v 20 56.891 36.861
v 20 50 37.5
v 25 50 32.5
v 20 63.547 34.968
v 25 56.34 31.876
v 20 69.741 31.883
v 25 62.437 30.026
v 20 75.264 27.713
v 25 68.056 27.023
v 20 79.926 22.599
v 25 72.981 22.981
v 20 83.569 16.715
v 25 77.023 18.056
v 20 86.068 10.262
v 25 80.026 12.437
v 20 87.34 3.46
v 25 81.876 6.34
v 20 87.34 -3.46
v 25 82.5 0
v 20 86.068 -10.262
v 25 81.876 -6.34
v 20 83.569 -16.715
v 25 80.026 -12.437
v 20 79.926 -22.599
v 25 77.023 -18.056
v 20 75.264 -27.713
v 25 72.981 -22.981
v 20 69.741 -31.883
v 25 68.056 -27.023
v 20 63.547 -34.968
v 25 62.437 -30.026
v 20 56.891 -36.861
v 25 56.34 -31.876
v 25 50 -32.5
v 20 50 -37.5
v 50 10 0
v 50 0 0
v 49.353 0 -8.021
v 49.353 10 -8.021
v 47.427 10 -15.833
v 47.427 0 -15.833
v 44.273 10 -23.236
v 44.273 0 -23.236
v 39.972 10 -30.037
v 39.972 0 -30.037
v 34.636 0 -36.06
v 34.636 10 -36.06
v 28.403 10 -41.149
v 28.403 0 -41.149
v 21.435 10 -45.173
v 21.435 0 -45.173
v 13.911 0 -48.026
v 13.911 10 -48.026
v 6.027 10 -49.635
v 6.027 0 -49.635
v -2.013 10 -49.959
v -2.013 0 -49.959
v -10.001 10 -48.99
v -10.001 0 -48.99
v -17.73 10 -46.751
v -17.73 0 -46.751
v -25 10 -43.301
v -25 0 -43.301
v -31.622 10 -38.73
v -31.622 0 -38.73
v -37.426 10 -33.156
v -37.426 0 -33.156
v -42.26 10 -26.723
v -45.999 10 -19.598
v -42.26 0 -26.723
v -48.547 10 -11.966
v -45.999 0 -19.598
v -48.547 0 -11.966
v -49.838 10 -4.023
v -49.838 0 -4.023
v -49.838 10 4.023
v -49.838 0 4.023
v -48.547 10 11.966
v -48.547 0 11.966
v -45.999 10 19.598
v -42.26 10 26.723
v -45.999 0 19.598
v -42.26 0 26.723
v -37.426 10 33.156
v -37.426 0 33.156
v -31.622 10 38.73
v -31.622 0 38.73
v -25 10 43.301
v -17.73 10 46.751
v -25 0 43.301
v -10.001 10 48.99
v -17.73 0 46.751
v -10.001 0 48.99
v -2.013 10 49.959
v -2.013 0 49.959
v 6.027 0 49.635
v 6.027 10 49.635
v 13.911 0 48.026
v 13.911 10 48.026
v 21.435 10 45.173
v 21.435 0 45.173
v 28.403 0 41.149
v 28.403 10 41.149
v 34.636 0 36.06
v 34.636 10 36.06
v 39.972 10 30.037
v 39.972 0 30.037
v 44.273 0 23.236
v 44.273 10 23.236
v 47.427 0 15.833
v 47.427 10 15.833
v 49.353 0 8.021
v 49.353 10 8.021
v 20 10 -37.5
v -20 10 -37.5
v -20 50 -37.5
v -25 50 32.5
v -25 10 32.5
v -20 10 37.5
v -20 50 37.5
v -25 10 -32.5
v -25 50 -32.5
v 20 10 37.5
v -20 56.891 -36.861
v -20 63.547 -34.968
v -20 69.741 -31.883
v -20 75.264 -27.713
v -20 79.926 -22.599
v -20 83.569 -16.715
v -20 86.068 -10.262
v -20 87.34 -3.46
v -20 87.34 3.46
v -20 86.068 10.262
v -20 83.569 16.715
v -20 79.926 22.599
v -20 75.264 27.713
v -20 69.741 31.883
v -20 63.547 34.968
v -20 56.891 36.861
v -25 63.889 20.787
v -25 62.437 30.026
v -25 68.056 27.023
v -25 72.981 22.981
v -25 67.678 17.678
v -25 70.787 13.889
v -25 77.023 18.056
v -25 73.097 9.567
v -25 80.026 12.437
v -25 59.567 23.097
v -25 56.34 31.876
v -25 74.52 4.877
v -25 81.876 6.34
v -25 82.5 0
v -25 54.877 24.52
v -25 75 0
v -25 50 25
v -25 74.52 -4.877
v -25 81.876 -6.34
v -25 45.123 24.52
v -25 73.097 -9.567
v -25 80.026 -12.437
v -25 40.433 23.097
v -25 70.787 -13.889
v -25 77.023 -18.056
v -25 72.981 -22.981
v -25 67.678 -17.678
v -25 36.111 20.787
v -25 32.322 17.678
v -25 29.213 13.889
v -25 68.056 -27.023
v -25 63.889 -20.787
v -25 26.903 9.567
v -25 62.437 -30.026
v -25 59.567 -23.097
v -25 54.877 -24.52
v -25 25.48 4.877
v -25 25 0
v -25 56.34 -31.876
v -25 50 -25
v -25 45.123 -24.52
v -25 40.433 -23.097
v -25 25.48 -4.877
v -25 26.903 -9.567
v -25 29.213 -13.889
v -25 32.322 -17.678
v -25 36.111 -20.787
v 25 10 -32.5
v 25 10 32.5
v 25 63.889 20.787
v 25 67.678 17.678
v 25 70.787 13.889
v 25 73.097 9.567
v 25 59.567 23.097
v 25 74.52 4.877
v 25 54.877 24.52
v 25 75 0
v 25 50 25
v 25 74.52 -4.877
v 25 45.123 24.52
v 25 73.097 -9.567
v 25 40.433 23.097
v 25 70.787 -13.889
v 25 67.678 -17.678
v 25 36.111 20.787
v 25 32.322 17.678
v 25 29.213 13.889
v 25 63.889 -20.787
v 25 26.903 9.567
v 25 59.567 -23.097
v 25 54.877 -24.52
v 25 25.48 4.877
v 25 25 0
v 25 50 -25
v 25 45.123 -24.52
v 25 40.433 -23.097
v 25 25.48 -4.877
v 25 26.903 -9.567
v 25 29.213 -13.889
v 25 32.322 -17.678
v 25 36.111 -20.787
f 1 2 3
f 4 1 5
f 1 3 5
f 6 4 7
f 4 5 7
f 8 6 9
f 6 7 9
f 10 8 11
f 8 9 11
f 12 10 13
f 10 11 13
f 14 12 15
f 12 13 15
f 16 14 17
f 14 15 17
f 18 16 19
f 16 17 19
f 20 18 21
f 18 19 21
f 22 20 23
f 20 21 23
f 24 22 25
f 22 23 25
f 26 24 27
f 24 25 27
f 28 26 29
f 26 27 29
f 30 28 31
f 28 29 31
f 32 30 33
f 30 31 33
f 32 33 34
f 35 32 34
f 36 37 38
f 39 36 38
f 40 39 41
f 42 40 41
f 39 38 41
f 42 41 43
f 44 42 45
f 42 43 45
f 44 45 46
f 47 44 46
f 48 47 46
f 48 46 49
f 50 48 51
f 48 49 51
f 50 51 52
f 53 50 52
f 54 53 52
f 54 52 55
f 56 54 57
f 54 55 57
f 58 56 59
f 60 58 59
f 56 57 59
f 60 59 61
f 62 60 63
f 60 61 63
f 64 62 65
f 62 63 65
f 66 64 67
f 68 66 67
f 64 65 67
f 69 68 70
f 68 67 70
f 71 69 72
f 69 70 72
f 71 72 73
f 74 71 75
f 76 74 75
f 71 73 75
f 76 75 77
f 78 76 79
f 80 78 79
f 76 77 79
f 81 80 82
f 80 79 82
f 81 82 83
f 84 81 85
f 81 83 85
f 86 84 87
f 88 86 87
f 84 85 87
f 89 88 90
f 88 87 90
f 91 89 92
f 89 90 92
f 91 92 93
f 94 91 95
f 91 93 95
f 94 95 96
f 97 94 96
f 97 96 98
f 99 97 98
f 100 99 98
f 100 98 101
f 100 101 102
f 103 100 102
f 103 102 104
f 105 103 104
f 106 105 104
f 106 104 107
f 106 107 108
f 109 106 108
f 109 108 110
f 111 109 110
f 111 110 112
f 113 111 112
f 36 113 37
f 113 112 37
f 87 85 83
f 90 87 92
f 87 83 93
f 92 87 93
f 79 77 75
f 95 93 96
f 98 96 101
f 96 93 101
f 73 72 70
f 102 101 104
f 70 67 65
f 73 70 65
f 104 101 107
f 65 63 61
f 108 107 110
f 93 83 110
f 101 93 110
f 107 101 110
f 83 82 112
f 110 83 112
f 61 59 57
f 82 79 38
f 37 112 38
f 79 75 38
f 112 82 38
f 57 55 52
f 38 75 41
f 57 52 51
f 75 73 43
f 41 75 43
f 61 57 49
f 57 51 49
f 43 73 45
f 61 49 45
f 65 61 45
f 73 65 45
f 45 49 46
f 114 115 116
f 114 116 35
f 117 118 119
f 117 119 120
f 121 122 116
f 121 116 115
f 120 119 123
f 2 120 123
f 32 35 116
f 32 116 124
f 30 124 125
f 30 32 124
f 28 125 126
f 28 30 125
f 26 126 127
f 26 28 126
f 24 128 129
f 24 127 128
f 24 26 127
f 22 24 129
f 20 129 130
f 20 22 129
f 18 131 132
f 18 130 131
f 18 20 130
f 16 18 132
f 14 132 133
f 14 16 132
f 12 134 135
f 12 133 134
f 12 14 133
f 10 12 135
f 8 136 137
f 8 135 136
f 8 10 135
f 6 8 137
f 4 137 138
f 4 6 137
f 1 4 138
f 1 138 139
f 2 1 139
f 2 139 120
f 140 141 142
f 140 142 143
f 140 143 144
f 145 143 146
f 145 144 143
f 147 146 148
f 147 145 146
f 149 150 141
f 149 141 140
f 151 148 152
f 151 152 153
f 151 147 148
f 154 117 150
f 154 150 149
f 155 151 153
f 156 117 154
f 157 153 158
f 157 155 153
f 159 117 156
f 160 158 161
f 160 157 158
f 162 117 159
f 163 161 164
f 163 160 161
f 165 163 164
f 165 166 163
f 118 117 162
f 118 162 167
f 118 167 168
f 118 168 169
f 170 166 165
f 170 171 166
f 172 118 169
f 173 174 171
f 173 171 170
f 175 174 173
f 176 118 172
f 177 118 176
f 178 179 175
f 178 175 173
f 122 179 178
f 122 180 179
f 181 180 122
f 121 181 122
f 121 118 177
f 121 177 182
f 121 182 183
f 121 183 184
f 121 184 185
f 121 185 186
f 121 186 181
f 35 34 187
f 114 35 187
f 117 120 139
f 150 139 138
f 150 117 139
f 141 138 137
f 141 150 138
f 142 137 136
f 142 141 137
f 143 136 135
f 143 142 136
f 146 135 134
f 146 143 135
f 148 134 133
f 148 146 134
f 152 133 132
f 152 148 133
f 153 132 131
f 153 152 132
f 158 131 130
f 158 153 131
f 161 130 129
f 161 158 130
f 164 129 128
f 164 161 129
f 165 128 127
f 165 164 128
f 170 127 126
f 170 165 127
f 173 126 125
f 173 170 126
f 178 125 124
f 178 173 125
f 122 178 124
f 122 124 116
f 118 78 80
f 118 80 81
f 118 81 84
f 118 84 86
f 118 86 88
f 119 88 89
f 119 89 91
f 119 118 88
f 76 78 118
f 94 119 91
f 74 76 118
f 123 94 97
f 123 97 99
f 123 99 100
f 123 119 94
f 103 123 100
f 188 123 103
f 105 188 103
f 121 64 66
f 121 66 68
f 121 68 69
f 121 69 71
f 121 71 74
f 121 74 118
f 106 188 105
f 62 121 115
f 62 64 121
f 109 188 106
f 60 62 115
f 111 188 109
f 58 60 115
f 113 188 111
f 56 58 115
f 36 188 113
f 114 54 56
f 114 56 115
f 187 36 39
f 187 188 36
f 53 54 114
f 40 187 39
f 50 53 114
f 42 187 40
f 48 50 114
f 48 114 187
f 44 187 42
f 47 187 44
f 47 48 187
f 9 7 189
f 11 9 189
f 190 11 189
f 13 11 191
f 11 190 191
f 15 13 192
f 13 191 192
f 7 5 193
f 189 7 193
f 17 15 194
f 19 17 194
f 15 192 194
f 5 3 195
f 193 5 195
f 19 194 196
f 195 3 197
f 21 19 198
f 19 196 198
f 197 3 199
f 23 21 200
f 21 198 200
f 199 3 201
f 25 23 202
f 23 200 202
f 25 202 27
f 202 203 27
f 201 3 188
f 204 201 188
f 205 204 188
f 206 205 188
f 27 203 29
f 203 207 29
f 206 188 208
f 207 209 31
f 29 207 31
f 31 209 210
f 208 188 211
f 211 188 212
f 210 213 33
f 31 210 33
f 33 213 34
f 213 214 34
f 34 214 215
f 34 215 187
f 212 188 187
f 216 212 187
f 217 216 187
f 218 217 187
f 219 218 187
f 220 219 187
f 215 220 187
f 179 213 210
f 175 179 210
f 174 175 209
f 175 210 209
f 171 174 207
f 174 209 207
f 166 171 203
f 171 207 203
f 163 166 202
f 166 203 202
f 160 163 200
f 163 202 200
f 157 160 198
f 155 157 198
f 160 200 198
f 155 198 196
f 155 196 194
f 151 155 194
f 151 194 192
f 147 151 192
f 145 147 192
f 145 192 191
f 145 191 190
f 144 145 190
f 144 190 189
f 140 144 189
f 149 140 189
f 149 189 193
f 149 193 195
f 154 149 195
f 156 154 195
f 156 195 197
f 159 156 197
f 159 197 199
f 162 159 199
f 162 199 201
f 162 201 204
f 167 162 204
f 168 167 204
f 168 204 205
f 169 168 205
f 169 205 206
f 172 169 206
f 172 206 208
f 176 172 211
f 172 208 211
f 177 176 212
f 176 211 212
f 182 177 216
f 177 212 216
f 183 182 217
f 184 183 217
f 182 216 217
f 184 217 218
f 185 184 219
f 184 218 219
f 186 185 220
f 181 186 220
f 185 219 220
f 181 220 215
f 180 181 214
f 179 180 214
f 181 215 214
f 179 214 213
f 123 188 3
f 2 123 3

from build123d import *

# Parameters (mm, degrees)
SKETCH1_R           = 50
BOSS_EXTRUDE1_DEPTH = 10
SKETCH2_W           = 50
SKETCH2_H           = 75
BOSS_EXTRUDE2_DEPTH = 80
SKETCH3_R           = 25
CUT_EXTRUDE4_DEPTH  = 76
CUT_EXTRUDE5_DEPTH  = 76
CHAMFER1_SIZE       = 5


with BuildPart() as part:
    # Sketch1 → Boss-Extrude1 (new body)
    with BuildSketch(Plane(origin=(0, 0, 0), x_dir=(1, 0, 0), z_dir=(0, 1, 0))):
        Circle(SKETCH1_R)
    extrude(amount=BOSS_EXTRUDE1_DEPTH)

    # Sketch2 → Boss-Extrude2 (add)
    with BuildSketch(Plane(origin=(0, 10, 0), x_dir=(1, 0, 0), z_dir=(0, 1, 0))):
        Rectangle(SKETCH2_W, SKETCH2_H)
    extrude(amount=BOSS_EXTRUDE2_DEPTH)

    # Sketch3 → Cut-Extrude4 (cut, through all)
    with BuildSketch(Plane(origin=(25, 0, 0), x_dir=(0, 0, -1), z_dir=(1, 0, 0))):
        with Locations((0, 50)):
            Circle(SKETCH3_R)
    extrude(amount=-CUT_EXTRUDE4_DEPTH, mode=Mode.SUBTRACT)

    # Sketch4 → Cut-Extrude5 (cut, through all)
    with BuildSketch(Plane(origin=(25, 0, 0), x_dir=(0, 0, -1), z_dir=(1, 0, 0))):
        with BuildLine():
            Line((-37.5, 50), (-37.5, 90))
            Line((-37.5, 90), (37.5, 90))
            Line((37.5, 90), (37.5, 50))
            ThreePointArc((37.5, 50), (0, 87.5), (-37.5, 50))
        make_face()
    extrude(amount=-CUT_EXTRUDE5_DEPTH, mode=Mode.SUBTRACT)

    # Chamfer1
    chamfer1_edges = [part.edges().sort_by_distance(p)[0] for p in [
        (25, 30, 37.5),
        (-25, 30, 37.5),
        (-25, 30, -37.5),
        (25, 30, -37.5),
        (-25, 87.5, 0),
        (25, 87.5, 0),
    ]]
    chamfer(chamfer1_edges, length=CHAMFER1_SIZE)


solid = part.part
